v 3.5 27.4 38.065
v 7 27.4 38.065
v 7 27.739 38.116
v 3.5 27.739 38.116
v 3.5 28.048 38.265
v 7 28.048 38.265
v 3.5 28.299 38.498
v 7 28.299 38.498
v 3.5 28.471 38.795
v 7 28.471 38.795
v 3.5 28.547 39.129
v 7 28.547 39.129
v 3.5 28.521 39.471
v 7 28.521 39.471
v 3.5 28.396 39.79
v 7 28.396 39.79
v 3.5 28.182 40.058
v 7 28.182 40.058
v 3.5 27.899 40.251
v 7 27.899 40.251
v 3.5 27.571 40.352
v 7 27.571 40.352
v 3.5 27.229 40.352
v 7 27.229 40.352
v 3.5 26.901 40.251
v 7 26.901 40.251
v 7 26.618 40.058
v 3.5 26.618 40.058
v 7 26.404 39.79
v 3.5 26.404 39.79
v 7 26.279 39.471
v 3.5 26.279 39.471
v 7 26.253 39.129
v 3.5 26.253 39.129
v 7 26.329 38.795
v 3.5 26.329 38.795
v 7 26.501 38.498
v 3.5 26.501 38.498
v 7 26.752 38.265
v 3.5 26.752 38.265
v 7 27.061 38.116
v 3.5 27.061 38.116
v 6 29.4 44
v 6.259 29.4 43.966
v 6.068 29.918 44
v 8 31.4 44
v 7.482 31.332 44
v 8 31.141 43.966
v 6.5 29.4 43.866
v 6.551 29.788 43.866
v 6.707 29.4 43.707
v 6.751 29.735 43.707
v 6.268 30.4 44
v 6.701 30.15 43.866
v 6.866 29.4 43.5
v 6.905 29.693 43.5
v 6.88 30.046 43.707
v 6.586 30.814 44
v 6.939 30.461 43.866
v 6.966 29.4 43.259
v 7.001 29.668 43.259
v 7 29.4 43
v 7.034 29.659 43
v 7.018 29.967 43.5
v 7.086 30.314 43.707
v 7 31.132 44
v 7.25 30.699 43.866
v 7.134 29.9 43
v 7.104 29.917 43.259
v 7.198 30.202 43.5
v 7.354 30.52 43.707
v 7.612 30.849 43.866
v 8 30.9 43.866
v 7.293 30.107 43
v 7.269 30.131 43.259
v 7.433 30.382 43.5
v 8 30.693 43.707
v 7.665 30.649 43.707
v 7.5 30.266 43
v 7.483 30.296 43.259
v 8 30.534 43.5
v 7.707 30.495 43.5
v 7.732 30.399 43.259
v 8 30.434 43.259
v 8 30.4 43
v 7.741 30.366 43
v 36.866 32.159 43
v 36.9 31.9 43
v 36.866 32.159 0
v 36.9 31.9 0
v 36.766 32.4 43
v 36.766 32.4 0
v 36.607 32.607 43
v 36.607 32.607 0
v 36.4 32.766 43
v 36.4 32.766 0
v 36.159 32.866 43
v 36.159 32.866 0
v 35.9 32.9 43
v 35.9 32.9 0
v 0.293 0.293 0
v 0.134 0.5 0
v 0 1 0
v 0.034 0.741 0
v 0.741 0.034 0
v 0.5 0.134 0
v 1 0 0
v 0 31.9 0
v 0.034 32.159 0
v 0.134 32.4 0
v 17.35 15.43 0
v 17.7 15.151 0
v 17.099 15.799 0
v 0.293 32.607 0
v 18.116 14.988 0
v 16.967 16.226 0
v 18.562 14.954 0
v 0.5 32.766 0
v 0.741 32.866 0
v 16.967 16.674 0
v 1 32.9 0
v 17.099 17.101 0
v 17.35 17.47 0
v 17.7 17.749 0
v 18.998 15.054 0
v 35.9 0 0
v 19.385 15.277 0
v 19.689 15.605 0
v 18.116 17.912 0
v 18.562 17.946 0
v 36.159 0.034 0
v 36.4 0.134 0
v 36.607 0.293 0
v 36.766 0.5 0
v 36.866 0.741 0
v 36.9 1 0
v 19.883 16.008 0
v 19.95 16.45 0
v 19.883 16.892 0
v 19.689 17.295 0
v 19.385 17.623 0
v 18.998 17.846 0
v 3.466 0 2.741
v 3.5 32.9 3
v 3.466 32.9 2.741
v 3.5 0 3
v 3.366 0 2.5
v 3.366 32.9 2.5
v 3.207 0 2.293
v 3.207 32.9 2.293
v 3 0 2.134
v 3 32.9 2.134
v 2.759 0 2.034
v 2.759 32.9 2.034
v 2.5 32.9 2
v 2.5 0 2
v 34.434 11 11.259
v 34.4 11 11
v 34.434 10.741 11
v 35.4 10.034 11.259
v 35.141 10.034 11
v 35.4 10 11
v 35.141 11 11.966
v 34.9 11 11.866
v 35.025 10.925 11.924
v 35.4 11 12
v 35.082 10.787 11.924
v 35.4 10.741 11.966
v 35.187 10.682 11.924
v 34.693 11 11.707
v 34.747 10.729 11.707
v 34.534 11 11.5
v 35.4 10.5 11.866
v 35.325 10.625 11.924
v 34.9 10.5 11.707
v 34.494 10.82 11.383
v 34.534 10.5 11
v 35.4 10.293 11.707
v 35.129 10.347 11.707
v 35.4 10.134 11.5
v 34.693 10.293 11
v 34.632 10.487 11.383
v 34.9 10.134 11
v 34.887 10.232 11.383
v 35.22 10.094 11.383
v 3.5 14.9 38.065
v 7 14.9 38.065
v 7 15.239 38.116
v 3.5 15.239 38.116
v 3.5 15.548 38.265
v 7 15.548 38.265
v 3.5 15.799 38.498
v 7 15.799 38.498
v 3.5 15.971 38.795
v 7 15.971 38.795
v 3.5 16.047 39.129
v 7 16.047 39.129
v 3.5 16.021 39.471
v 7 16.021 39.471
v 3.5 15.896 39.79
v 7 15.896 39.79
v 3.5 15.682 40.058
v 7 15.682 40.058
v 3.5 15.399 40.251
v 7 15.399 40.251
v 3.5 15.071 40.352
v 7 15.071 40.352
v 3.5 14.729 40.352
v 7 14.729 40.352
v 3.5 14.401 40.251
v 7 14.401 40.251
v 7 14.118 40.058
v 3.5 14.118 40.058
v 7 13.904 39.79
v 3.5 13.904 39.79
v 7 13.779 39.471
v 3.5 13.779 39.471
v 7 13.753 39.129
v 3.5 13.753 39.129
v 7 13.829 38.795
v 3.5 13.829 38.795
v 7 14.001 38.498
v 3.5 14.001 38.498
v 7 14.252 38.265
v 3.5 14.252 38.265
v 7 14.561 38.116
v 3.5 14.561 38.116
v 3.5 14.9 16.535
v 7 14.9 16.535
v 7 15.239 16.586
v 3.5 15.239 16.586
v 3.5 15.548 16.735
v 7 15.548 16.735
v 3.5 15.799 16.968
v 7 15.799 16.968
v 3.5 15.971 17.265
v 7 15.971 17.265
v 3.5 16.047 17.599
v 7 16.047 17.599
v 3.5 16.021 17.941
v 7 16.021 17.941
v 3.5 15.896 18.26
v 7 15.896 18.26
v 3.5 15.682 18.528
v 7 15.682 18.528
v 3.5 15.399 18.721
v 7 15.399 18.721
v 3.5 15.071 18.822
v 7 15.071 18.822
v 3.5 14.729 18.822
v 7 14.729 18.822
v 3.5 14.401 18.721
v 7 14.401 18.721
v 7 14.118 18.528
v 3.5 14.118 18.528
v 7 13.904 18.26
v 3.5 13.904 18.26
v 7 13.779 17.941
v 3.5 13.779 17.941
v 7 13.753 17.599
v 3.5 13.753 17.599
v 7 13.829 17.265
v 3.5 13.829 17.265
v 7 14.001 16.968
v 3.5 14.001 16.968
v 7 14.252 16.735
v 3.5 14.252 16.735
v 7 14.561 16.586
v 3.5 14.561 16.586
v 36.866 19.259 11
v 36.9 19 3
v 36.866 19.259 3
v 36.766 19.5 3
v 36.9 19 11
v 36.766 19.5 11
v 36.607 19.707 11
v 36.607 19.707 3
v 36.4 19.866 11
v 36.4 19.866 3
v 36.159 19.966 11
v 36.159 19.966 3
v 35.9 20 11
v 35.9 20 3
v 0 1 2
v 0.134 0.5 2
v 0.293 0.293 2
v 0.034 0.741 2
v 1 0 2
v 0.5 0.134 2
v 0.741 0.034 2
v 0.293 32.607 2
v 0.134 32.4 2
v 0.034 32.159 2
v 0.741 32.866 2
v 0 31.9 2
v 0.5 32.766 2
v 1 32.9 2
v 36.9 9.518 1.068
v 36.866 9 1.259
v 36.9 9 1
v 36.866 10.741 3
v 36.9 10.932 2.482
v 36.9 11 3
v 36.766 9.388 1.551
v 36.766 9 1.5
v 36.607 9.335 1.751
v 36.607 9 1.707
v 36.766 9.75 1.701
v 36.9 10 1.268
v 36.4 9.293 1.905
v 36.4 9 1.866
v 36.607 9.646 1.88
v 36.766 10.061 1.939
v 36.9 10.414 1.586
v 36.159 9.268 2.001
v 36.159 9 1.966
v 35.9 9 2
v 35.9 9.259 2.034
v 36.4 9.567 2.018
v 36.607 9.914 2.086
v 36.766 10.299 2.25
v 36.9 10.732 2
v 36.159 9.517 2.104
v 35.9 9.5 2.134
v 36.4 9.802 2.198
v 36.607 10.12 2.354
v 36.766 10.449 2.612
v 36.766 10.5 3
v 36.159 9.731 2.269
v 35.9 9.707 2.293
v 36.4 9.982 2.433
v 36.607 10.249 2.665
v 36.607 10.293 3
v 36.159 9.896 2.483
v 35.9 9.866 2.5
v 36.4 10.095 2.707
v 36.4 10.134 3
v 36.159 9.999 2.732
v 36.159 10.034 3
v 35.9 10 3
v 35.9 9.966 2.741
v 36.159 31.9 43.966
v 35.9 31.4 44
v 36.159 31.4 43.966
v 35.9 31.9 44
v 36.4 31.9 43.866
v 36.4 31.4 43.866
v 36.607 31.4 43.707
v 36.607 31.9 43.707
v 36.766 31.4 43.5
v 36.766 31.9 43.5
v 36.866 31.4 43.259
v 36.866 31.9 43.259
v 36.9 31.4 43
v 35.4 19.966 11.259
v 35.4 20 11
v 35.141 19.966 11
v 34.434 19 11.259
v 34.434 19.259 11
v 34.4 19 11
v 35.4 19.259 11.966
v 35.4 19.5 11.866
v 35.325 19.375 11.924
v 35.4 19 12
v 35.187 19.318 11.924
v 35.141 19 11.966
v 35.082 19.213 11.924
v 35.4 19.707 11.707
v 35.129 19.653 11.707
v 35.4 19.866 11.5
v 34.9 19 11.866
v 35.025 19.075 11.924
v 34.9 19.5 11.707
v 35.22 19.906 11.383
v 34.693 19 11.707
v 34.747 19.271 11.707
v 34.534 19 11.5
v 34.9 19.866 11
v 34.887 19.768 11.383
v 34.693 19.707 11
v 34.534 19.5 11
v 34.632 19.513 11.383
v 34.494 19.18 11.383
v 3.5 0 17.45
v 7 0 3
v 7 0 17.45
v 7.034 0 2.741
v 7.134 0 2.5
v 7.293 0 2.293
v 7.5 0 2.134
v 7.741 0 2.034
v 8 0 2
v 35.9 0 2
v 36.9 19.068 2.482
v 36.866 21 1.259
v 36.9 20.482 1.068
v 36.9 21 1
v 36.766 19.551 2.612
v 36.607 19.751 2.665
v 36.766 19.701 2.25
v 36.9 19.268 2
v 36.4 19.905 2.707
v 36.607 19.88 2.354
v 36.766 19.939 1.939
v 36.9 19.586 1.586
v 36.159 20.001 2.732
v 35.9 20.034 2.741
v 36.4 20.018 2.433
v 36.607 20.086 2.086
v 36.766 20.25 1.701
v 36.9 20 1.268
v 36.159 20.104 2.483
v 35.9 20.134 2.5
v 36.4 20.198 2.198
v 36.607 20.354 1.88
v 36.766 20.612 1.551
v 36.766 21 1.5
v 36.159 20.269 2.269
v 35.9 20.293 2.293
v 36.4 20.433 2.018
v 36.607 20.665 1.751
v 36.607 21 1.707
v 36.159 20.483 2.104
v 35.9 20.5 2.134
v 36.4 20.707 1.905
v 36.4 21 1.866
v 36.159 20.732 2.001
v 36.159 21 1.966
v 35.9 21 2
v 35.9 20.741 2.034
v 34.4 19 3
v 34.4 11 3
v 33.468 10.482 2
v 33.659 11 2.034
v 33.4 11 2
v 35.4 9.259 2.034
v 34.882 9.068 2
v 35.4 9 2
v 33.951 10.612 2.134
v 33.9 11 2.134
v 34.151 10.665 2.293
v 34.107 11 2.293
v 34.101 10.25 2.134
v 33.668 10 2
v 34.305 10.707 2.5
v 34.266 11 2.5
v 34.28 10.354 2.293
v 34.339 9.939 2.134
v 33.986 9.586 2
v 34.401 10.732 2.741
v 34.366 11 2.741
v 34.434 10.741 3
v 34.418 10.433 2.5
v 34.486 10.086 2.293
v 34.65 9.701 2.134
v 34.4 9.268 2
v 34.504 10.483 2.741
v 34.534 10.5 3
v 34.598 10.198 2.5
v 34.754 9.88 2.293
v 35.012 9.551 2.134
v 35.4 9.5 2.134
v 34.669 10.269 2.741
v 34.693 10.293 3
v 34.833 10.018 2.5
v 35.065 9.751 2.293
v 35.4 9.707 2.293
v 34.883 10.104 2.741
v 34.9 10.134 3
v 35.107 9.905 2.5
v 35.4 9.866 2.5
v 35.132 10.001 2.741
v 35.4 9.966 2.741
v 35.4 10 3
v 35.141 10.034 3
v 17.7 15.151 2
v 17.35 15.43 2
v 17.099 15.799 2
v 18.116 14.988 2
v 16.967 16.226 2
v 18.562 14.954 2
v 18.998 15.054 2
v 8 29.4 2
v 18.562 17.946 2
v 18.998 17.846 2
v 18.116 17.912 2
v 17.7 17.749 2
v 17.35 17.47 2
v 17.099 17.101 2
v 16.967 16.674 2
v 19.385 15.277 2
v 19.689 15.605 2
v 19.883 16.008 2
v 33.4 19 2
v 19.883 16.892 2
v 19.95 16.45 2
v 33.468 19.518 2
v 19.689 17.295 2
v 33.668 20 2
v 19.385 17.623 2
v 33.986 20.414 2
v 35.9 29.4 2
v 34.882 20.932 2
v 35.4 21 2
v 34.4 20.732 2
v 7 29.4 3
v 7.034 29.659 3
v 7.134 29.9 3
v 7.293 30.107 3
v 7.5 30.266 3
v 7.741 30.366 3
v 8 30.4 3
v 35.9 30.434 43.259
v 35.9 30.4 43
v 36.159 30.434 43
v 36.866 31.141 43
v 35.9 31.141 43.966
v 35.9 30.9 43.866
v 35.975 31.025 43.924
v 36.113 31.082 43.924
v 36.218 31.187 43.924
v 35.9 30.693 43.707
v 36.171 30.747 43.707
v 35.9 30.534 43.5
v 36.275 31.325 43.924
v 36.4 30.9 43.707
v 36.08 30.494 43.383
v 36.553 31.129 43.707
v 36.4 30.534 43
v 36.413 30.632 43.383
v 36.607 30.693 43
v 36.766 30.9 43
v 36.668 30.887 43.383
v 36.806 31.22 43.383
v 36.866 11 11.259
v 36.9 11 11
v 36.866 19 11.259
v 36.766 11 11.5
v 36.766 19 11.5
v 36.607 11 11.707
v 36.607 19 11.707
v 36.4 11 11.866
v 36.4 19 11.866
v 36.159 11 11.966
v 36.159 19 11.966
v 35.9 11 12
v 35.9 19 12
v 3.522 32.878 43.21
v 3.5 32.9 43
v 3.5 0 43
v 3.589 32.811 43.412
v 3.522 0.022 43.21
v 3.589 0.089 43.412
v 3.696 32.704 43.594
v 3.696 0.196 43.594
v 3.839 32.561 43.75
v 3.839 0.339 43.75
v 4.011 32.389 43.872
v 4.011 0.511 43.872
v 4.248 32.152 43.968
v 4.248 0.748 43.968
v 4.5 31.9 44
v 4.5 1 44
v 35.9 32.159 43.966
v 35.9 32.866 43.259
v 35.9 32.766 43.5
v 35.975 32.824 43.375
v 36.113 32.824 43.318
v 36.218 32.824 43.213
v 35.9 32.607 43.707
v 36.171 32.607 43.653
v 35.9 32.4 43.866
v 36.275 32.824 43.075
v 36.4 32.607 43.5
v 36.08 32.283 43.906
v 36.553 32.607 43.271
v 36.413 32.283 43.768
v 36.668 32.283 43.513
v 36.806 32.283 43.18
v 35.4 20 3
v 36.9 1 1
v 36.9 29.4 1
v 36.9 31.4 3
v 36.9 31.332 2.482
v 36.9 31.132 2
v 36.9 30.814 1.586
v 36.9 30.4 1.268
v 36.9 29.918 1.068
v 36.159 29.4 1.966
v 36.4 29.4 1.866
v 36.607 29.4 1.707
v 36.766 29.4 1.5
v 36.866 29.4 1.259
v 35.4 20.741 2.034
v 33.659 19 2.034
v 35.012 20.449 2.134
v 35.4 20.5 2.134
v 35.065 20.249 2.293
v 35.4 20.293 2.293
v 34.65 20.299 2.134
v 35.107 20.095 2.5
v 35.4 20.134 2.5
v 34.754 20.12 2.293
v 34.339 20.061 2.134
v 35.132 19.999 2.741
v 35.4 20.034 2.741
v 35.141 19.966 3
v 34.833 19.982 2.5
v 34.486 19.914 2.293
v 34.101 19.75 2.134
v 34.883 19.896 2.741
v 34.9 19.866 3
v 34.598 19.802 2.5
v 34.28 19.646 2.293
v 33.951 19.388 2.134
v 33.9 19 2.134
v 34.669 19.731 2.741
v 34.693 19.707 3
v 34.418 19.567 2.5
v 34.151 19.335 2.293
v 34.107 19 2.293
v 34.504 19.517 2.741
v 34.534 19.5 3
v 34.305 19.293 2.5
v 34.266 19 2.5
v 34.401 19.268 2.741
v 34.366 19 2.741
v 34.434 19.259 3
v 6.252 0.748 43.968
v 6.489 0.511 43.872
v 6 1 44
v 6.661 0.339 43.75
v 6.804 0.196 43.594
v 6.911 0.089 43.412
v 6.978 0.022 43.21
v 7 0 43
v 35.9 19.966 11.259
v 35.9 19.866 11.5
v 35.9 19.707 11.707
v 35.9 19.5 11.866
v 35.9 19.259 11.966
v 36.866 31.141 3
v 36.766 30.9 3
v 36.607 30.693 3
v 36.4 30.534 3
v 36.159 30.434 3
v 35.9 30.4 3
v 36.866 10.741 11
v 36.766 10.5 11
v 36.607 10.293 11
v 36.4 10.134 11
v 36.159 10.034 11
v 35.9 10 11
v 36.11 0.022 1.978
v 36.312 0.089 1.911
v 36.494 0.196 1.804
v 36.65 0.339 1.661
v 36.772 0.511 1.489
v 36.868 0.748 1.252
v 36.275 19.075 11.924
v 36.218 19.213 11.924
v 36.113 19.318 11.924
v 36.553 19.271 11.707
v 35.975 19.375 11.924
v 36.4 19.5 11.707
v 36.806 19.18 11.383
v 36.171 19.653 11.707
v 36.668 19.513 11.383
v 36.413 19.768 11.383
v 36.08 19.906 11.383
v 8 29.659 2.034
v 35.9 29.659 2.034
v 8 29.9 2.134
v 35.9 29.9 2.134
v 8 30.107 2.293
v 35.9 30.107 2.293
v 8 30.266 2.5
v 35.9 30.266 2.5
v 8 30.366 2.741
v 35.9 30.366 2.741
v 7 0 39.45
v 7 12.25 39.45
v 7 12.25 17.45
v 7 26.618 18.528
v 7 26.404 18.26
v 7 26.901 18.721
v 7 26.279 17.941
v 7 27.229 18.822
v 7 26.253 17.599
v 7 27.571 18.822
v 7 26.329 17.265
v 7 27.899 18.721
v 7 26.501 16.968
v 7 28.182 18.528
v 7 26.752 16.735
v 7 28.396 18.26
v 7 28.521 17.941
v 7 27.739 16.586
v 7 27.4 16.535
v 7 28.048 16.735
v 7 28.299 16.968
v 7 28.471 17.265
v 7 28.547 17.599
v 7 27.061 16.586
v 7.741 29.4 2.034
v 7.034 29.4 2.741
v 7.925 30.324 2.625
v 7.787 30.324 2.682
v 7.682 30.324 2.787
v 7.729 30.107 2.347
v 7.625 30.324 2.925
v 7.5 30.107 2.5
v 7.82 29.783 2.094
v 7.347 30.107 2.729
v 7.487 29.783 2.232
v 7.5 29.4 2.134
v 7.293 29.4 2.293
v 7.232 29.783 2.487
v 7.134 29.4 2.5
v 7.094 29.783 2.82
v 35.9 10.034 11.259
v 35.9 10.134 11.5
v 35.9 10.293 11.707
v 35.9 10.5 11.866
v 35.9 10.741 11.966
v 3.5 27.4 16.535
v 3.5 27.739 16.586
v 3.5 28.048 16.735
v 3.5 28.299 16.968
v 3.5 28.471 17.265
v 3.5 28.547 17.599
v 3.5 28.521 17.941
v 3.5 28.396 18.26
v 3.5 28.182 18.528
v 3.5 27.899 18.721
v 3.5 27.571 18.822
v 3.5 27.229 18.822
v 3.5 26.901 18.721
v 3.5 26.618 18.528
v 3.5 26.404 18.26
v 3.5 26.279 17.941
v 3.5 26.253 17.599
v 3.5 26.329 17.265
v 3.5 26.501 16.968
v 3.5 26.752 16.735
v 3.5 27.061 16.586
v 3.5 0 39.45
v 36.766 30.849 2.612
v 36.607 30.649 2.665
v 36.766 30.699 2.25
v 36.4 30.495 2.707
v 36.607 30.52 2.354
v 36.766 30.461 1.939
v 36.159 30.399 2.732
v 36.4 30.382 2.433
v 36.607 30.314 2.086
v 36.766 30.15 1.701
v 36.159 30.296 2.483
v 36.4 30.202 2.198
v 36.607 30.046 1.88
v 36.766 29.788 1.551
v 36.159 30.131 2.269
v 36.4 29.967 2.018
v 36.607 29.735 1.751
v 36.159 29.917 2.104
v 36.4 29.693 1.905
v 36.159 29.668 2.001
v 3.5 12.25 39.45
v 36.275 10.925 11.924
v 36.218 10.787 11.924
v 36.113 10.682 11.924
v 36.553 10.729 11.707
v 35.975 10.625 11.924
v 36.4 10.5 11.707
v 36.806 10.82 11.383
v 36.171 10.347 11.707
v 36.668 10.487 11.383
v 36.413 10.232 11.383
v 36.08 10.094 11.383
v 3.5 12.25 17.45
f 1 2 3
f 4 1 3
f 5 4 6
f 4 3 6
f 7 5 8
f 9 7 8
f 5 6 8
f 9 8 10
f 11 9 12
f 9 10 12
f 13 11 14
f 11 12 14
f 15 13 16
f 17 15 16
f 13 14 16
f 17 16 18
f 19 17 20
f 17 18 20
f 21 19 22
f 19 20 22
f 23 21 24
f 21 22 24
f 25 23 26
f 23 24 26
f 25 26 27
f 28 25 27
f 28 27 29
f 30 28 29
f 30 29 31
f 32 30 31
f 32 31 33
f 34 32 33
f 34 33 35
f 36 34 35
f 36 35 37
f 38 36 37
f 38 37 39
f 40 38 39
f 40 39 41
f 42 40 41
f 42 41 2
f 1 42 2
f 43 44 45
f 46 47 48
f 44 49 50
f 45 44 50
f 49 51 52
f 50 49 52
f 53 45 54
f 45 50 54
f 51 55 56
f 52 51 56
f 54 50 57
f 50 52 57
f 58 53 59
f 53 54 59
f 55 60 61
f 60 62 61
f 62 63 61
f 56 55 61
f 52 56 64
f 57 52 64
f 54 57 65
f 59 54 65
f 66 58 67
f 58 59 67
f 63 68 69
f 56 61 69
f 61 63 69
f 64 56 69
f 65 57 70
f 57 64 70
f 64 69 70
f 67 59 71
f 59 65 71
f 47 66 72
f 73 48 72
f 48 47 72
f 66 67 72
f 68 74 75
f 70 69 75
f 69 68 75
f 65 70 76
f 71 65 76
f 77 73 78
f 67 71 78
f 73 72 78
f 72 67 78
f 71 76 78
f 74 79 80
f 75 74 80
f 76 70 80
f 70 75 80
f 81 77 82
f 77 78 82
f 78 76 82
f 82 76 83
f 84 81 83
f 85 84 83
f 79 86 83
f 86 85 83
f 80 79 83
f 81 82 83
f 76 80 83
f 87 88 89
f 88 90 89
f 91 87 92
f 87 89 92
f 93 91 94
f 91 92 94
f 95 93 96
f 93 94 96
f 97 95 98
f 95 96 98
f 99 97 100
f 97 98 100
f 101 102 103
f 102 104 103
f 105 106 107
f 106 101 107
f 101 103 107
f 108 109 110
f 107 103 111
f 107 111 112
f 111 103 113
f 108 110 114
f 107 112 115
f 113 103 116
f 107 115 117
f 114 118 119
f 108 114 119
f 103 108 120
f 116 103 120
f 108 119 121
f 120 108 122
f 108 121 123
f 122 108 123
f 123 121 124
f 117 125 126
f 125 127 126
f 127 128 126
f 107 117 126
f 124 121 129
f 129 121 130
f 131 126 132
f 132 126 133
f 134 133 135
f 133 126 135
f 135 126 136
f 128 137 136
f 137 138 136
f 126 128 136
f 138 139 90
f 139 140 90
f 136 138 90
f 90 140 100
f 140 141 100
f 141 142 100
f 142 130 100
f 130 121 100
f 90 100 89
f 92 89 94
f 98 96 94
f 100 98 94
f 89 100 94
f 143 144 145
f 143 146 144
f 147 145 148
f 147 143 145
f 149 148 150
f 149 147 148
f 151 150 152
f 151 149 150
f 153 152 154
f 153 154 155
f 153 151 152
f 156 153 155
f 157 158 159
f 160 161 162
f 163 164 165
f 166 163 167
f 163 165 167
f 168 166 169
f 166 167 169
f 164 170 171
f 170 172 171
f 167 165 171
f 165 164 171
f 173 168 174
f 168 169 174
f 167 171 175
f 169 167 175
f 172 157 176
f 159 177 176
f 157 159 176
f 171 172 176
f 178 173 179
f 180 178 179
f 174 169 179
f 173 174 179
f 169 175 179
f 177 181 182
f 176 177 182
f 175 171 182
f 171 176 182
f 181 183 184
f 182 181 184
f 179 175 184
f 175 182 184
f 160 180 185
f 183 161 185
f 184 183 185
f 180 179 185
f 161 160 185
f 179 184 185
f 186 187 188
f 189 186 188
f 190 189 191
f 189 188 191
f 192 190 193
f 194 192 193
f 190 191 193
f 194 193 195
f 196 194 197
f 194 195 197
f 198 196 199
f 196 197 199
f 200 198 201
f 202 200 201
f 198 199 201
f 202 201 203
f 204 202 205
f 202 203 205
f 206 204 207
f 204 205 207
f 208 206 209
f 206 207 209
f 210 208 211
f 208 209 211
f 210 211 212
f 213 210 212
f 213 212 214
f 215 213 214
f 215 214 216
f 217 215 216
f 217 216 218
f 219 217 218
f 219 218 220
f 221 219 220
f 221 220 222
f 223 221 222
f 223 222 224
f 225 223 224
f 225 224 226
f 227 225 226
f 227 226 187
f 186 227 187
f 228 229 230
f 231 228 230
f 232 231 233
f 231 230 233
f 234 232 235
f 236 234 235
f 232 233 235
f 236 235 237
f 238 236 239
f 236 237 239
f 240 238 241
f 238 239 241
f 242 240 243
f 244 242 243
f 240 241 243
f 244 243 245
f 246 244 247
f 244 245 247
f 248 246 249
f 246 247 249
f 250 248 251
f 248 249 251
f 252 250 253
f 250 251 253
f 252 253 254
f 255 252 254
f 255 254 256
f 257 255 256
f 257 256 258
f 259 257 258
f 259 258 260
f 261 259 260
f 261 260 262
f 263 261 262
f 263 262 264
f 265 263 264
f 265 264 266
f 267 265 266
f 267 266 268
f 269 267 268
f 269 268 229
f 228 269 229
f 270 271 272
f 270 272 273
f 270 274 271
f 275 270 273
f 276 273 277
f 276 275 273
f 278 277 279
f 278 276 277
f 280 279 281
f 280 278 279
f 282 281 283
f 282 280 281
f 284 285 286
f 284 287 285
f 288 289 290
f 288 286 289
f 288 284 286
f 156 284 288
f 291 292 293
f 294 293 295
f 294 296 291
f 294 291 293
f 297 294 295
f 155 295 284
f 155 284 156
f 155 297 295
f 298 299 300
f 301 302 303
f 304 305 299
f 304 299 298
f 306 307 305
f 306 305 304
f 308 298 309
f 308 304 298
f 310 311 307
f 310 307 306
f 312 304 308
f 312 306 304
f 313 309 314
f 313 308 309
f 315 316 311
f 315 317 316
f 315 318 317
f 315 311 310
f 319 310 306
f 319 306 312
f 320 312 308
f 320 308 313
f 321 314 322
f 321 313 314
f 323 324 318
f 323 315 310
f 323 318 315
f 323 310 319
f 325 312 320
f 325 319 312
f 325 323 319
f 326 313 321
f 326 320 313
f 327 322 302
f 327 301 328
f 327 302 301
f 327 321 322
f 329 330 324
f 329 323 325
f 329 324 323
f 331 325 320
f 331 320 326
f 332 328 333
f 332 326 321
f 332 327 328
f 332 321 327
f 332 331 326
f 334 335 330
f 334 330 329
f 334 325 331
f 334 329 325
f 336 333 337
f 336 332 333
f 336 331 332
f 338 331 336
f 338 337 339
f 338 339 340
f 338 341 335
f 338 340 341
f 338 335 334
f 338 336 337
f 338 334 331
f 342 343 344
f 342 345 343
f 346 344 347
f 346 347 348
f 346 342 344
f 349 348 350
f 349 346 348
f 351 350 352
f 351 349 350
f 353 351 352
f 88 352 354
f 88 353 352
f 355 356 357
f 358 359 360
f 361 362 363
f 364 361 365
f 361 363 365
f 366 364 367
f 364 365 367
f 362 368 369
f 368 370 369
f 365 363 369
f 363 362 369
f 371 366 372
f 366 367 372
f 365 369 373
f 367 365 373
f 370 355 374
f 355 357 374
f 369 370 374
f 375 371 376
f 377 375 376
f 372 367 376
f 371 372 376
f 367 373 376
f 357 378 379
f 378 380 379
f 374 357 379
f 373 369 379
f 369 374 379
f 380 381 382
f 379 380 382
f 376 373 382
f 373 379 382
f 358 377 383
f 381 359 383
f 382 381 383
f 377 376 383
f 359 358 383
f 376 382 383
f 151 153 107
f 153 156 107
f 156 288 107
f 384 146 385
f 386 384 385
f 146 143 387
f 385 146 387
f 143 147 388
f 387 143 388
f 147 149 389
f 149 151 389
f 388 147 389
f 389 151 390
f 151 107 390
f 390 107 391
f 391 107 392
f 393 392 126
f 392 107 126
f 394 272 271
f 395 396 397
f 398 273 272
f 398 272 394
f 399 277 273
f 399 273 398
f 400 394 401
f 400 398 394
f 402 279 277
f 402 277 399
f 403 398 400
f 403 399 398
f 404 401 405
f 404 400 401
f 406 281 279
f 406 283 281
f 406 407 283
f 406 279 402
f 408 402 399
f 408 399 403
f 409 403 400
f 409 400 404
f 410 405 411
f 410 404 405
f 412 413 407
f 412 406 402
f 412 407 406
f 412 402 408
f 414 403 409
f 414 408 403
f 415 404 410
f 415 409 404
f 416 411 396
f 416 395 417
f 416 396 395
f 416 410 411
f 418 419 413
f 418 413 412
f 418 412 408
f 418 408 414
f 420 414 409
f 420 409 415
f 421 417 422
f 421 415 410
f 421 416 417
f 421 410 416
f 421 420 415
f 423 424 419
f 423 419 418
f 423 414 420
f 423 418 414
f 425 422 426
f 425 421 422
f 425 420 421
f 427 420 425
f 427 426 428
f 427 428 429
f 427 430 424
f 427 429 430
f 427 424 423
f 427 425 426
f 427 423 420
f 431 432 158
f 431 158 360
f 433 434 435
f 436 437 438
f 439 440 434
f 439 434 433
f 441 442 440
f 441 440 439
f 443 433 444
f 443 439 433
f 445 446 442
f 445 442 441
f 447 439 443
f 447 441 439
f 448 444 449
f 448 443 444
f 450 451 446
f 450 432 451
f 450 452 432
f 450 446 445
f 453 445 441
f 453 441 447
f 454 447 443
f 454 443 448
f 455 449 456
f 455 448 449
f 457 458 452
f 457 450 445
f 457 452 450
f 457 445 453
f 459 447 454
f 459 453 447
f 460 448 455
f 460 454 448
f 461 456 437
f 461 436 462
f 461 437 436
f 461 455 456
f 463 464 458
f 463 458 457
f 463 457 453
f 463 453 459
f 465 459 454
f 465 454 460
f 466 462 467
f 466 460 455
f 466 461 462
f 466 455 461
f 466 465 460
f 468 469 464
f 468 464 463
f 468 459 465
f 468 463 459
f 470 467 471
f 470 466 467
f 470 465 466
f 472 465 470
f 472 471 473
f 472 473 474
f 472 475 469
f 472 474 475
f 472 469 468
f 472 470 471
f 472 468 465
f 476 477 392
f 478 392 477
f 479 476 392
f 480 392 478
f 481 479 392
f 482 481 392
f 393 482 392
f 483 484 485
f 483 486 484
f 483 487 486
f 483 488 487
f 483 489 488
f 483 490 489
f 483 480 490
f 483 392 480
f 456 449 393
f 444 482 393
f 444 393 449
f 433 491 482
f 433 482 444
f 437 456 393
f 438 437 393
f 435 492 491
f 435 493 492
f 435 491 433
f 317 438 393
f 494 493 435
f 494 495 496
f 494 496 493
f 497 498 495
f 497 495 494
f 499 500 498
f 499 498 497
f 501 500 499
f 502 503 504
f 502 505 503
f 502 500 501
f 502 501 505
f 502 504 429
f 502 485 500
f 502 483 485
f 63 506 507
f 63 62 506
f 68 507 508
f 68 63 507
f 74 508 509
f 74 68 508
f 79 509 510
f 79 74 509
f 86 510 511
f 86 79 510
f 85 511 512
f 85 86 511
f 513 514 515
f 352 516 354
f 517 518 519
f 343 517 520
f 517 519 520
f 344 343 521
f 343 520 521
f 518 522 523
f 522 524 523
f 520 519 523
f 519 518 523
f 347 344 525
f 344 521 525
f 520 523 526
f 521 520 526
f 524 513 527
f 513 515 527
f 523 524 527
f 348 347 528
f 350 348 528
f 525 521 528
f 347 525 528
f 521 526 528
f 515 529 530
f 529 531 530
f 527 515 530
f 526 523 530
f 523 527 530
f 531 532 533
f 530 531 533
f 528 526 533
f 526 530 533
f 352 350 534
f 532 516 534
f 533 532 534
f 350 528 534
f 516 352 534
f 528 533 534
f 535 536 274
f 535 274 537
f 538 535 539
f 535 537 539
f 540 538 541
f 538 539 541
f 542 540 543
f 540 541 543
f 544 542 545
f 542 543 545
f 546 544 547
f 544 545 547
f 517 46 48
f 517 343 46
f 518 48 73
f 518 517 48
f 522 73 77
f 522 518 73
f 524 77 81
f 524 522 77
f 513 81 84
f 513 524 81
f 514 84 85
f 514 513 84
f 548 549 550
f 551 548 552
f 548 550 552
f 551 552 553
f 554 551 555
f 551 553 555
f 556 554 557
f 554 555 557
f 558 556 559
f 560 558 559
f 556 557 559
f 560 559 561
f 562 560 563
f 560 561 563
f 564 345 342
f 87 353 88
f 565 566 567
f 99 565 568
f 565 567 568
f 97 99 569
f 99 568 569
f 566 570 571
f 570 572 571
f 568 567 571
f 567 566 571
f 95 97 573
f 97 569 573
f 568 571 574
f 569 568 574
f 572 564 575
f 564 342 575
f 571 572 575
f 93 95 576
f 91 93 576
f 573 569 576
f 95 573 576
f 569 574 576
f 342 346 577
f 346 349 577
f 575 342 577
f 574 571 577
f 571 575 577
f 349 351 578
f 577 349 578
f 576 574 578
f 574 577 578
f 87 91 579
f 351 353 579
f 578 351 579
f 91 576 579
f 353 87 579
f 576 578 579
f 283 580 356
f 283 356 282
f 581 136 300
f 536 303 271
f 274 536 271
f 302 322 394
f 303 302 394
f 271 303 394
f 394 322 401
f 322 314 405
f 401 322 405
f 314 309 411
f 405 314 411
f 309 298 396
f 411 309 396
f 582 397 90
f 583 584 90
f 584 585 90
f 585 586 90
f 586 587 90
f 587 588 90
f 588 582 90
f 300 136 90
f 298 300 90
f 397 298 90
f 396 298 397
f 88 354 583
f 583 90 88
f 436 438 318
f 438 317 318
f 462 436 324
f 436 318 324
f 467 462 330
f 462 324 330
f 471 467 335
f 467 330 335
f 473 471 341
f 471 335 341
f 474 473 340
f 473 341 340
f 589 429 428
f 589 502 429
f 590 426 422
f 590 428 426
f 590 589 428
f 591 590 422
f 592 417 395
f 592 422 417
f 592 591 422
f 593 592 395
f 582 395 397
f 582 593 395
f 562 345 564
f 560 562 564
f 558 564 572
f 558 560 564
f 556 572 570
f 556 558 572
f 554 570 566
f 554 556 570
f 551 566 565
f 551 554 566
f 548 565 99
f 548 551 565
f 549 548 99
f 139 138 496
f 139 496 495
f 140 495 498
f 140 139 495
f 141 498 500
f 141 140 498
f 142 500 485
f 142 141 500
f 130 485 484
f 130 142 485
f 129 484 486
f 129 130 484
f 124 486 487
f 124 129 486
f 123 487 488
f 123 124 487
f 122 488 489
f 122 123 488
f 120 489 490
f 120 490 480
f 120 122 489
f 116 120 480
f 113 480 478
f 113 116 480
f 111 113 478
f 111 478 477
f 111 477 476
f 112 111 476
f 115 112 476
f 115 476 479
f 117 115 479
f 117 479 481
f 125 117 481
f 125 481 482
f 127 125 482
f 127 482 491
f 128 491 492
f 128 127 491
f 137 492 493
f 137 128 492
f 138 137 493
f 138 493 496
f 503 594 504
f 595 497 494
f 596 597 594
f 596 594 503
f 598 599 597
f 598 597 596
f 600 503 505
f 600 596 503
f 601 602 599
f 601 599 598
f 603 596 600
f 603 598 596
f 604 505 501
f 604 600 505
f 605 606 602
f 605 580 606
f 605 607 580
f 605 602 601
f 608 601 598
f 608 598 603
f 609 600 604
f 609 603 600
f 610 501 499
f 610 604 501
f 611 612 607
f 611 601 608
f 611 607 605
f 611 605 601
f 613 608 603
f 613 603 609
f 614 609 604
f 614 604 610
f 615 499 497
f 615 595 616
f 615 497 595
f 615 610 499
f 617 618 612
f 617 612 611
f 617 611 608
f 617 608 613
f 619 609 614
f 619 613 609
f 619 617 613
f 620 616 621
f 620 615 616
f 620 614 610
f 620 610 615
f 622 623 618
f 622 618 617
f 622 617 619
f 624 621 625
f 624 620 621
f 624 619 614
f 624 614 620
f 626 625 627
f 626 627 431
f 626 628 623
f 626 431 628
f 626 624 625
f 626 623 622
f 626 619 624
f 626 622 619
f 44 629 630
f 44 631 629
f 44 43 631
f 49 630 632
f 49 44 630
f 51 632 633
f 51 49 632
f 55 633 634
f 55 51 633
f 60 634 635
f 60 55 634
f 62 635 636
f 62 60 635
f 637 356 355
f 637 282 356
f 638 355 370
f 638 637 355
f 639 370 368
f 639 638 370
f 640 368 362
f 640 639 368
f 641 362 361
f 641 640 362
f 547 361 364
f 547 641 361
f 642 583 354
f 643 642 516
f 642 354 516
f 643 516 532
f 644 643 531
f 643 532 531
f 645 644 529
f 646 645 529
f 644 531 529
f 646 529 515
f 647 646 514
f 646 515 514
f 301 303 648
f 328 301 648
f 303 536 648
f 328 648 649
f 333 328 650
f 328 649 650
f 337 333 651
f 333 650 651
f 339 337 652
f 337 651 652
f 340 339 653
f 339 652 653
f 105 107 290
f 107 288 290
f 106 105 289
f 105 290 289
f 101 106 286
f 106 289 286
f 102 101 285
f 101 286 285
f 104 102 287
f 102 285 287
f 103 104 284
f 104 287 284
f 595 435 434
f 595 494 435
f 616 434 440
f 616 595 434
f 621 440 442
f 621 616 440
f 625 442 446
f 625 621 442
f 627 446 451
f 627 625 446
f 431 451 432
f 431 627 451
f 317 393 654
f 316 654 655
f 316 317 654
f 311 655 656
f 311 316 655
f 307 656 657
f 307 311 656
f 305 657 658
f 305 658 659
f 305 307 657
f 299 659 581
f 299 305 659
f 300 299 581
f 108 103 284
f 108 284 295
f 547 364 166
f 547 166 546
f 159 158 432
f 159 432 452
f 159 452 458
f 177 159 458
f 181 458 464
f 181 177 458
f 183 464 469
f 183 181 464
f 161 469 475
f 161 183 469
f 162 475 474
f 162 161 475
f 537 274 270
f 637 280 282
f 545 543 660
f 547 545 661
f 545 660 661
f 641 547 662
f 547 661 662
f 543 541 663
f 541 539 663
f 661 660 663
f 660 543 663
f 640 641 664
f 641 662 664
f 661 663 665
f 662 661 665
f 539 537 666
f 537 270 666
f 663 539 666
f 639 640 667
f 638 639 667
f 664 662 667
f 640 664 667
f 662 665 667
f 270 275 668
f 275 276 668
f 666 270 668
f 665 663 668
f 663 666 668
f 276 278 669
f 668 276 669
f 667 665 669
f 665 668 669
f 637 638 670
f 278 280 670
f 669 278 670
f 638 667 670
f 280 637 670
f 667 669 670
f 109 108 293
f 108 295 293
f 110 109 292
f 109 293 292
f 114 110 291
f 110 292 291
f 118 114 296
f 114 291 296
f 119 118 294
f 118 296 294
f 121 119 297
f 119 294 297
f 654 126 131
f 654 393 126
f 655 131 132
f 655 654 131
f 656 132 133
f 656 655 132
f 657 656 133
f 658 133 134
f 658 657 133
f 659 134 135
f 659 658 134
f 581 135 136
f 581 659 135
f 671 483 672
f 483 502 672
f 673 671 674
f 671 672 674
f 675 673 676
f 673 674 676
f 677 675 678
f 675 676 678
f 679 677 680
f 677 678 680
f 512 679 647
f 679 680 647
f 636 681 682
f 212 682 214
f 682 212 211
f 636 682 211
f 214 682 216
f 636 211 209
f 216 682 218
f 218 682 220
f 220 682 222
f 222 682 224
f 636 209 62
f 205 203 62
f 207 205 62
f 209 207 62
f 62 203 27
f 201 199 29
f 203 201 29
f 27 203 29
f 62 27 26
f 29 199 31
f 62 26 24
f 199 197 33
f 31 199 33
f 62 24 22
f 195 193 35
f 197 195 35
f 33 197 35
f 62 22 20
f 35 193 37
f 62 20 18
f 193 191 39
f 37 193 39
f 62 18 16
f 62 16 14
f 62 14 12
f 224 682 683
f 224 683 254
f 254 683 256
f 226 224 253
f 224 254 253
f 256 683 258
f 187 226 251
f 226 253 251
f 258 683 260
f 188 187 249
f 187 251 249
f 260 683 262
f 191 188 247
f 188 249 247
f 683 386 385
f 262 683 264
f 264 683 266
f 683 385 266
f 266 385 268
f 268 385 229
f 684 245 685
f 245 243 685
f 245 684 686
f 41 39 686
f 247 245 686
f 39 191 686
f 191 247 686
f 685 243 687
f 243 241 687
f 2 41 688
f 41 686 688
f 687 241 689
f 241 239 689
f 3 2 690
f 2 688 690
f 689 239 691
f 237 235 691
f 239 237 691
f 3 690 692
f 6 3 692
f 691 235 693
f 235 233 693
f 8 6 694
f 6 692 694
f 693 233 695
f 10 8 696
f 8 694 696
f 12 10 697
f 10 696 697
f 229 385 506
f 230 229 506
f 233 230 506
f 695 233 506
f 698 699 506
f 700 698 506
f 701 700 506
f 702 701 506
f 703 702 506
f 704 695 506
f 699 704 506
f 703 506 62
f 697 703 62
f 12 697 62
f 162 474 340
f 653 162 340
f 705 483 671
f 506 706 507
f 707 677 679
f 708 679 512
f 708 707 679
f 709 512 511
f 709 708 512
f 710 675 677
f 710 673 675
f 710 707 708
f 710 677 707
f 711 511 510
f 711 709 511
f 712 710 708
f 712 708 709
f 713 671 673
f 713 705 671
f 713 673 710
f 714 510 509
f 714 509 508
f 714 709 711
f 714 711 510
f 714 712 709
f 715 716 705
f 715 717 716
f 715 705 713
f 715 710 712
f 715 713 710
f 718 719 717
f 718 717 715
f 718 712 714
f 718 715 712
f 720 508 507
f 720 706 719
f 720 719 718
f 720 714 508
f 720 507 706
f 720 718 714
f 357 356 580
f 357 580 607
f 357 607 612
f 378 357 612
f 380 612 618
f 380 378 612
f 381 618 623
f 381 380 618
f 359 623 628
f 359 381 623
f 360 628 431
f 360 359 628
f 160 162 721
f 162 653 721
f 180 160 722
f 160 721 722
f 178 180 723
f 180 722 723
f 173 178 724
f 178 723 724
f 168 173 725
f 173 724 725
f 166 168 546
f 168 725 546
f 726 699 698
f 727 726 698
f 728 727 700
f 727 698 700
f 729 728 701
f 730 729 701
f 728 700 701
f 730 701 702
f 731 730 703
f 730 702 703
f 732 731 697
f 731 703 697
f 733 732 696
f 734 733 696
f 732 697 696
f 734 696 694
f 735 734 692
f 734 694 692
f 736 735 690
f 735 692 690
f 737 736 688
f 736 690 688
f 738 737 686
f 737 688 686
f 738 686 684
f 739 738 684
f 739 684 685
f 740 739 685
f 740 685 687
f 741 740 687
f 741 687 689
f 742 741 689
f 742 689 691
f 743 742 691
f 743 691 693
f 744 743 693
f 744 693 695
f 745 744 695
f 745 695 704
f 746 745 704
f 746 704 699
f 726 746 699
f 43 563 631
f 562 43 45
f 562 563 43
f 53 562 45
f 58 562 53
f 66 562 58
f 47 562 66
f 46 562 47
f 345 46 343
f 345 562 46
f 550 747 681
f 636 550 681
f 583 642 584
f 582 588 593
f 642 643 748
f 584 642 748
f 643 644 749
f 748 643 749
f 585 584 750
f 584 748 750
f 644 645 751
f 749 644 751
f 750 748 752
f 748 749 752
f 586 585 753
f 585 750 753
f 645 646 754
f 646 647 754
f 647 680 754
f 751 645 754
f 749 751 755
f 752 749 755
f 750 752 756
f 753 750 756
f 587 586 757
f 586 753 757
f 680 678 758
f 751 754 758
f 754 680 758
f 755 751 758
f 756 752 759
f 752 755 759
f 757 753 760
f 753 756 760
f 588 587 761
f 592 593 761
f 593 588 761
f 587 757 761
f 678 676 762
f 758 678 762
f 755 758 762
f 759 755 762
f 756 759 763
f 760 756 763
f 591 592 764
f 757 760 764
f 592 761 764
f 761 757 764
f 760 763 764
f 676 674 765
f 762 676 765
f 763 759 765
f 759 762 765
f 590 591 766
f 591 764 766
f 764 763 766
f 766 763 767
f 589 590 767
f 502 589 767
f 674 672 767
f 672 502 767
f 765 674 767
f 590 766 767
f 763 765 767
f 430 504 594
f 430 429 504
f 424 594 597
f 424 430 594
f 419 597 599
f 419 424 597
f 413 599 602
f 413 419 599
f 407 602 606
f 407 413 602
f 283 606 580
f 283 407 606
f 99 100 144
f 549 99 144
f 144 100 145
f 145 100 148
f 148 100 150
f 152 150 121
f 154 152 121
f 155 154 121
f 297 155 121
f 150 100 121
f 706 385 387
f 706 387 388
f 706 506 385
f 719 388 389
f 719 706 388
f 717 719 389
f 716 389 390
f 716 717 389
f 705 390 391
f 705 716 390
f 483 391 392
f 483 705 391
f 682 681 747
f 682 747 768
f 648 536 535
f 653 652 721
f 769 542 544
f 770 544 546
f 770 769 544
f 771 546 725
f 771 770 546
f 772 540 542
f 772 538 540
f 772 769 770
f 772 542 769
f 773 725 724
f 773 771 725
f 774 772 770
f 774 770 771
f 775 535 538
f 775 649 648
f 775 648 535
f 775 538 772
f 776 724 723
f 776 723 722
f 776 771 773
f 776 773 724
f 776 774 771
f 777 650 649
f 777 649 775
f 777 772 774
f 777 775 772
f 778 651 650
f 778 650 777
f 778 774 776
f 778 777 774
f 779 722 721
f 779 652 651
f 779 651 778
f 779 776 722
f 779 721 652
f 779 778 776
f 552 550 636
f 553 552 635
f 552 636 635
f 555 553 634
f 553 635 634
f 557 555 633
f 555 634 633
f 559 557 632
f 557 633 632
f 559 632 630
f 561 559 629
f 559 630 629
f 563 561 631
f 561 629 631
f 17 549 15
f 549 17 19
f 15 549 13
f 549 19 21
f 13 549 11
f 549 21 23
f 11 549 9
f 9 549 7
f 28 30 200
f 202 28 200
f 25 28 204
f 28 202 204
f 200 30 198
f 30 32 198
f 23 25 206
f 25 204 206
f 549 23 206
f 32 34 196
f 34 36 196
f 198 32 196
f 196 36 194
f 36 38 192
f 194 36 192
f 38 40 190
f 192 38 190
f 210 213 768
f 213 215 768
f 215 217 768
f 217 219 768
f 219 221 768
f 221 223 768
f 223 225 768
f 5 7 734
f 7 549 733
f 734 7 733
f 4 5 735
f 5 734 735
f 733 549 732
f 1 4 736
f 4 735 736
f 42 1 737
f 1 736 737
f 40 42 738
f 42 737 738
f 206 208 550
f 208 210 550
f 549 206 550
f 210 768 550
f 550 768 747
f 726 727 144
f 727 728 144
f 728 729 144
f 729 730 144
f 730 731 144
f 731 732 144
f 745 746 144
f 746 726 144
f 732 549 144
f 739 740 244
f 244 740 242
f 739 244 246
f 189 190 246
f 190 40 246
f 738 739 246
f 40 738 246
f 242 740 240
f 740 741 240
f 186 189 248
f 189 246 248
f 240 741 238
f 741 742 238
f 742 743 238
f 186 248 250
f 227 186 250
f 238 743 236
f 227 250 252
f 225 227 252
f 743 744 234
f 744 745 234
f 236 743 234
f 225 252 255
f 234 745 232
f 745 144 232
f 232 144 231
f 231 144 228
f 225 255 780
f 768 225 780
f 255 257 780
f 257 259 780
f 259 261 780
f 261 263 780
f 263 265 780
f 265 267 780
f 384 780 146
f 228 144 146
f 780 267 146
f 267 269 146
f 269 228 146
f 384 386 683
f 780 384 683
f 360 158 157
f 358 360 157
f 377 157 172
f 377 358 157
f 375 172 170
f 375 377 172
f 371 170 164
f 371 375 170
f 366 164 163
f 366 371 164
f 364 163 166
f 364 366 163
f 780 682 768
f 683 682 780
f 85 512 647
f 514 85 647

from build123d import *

# Parameters (mm, degrees)
SKETCH1_W           = 36.9
SKETCH1_H           = 32.9
SKETCH1_R           = 1.5
BOSS_EXTRUDE1_DEPTH = 2
BOSS_EXTRUDE2_DEPTH = 42
SKETCH5_W           = 2.5
SKETCH5_H           = 10
BOSS_EXTRUDE3_DEPTH = 10
FILLET1_R           = 1
CUT_EXTRUDE1_REACH  = 9
SKETCH3_R           = 1.15
SKETCH3_W           = 22
SKETCH3_H           = 12.25


with BuildPart() as part:
    # Sketch1 → Boss-Extrude1 (new body)
    with BuildSketch(Plane.XY):
        with Locations((18.45, 16.45)):
            Rectangle(SKETCH1_W, SKETCH1_H)
        with Locations((18.45, 16.45)):
            Circle(SKETCH1_R, mode=Mode.SUBTRACT)
    extrude(amount=BOSS_EXTRUDE1_DEPTH)

    # Sketch2 → Boss-Extrude2 (add)
    with BuildSketch(Plane.XY.offset(2)):
        Polygon((3.5, 0), (7, 0), (7, 30.4), (36.9, 30.4), (36.9, 32.9), (3.5, 32.9), align=None)
    extrude(amount=BOSS_EXTRUDE2_DEPTH)

    # Sketch5 → Boss-Extrude3 (add)
    with BuildSketch(Plane.XY.offset(2)):
        with Locations((35.65, 15)):
            Rectangle(SKETCH5_W, SKETCH5_H)
    extrude(amount=BOSS_EXTRUDE3_DEPTH)

    # Fillet1
    fillet1_edges = [part.edges().sort_by_distance(p)[0] for p in [
        (3.5, 16.45, 2),
        (7, 15.2, 2),
        (21.95, 30.4, 2),
        (7, 30.4, 23),
        (36.9, 30.4, 23),
        (3.5, 16.45, 44),
        (5.25, 0, 44),
        (7, 15.2, 44),
        (21.95, 30.4, 44),
        (36.9, 31.65, 44),
        (20.2, 32.9, 44),
        (36.9, 25.2, 2),
        (36.9, 10, 7),
        (35.65, 20, 2),
        (36.9, 20, 7),
        (34.4, 15, 2),
        (34.4, 20, 7),
        (35.65, 10, 2),
        (34.4, 10, 7),
        (36.9, 15, 12),
        (35.65, 20, 12),
        (34.4, 15, 12),
        (35.65, 10, 12),
        (36.9, 5, 2),
        (36.9, 0, 1),
        (0, 0, 1),
        (0, 32.9, 1),
        (36.9, 32.9, 22),
    ]]
    fillet(fillet1_edges, radius=FILLET1_R)

    # Sketch3 → Cut-Extrude1 (cut, up to next)
    with BuildSketch(Plane(origin=(7, 0, 0), x_dir=(0, 0, -1), z_dir=(1, 0, 0)), mode=Mode.PRIVATE) as cut_extrude1_sk1:
        with Locations((-39.215, 27.4)):
            Circle(SKETCH3_R)
    cut_extrude1_tool1 = extrude(cut_extrude1_sk1.sketch, amount=-CUT_EXTRUDE1_REACH, mode=Mode.PRIVATE) & part.part
    add(cut_extrude1_tool1.solids().sort_by_distance((7, 27.4, 39.215))[0], mode=Mode.SUBTRACT)
    # Sketch3 → Cut-Extrude1 (cut, up to next)
    with BuildSketch(Plane(origin=(7, 0, 0), x_dir=(0, 0, -1), z_dir=(1, 0, 0)), mode=Mode.PRIVATE) as cut_extrude1_sk2:
        with Locations((-17.685, 27.4)):
            Circle(SKETCH3_R)
    cut_extrude1_tool2 = extrude(cut_extrude1_sk2.sketch, amount=-CUT_EXTRUDE1_REACH, mode=Mode.PRIVATE) & part.part
    add(cut_extrude1_tool2.solids().sort_by_distance((7, 27.4, 17.685))[0], mode=Mode.SUBTRACT)
    # Sketch3 → Cut-Extrude1 (cut, up to next)
    with BuildSketch(Plane(origin=(7, 0, 0), x_dir=(0, 0, -1), z_dir=(1, 0, 0)), mode=Mode.PRIVATE) as cut_extrude1_sk3:
        with Locations((-39.215, 14.9)):
            Circle(SKETCH3_R)
    cut_extrude1_tool3 = extrude(cut_extrude1_sk3.sketch, amount=-CUT_EXTRUDE1_REACH, mode=Mode.PRIVATE) & part.part
    add(cut_extrude1_tool3.solids().sort_by_distance((7, 14.9, 39.215))[0], mode=Mode.SUBTRACT)
    # Sketch3 → Cut-Extrude1 (cut, up to next)
    with BuildSketch(Plane(origin=(7, 0, 0), x_dir=(0, 0, -1), z_dir=(1, 0, 0)), mode=Mode.PRIVATE) as cut_extrude1_sk4:
        with Locations((-17.685, 14.9)):
            Circle(SKETCH3_R)
    cut_extrude1_tool4 = extrude(cut_extrude1_sk4.sketch, amount=-CUT_EXTRUDE1_REACH, mode=Mode.PRIVATE) & part.part
    add(cut_extrude1_tool4.solids().sort_by_distance((7, 14.9, 17.685))[0], mode=Mode.SUBTRACT)
    # Sketch3 → Cut-Extrude1 (cut, up to next)
    with BuildSketch(Plane(origin=(7, 0, 0), x_dir=(0, 0, -1), z_dir=(1, 0, 0)), mode=Mode.PRIVATE) as cut_extrude1_sk5:
        with Locations((-28.45, 6.125)):
            Rectangle(SKETCH3_W, SKETCH3_H)
    cut_extrude1_tool5 = extrude(cut_extrude1_sk5.sketch, amount=-CUT_EXTRUDE1_REACH, mode=Mode.PRIVATE) & part.part
    add(cut_extrude1_tool5.solids().sort_by_distance((7, 6.125, 28.45))[0], mode=Mode.SUBTRACT)


solid = part.part
